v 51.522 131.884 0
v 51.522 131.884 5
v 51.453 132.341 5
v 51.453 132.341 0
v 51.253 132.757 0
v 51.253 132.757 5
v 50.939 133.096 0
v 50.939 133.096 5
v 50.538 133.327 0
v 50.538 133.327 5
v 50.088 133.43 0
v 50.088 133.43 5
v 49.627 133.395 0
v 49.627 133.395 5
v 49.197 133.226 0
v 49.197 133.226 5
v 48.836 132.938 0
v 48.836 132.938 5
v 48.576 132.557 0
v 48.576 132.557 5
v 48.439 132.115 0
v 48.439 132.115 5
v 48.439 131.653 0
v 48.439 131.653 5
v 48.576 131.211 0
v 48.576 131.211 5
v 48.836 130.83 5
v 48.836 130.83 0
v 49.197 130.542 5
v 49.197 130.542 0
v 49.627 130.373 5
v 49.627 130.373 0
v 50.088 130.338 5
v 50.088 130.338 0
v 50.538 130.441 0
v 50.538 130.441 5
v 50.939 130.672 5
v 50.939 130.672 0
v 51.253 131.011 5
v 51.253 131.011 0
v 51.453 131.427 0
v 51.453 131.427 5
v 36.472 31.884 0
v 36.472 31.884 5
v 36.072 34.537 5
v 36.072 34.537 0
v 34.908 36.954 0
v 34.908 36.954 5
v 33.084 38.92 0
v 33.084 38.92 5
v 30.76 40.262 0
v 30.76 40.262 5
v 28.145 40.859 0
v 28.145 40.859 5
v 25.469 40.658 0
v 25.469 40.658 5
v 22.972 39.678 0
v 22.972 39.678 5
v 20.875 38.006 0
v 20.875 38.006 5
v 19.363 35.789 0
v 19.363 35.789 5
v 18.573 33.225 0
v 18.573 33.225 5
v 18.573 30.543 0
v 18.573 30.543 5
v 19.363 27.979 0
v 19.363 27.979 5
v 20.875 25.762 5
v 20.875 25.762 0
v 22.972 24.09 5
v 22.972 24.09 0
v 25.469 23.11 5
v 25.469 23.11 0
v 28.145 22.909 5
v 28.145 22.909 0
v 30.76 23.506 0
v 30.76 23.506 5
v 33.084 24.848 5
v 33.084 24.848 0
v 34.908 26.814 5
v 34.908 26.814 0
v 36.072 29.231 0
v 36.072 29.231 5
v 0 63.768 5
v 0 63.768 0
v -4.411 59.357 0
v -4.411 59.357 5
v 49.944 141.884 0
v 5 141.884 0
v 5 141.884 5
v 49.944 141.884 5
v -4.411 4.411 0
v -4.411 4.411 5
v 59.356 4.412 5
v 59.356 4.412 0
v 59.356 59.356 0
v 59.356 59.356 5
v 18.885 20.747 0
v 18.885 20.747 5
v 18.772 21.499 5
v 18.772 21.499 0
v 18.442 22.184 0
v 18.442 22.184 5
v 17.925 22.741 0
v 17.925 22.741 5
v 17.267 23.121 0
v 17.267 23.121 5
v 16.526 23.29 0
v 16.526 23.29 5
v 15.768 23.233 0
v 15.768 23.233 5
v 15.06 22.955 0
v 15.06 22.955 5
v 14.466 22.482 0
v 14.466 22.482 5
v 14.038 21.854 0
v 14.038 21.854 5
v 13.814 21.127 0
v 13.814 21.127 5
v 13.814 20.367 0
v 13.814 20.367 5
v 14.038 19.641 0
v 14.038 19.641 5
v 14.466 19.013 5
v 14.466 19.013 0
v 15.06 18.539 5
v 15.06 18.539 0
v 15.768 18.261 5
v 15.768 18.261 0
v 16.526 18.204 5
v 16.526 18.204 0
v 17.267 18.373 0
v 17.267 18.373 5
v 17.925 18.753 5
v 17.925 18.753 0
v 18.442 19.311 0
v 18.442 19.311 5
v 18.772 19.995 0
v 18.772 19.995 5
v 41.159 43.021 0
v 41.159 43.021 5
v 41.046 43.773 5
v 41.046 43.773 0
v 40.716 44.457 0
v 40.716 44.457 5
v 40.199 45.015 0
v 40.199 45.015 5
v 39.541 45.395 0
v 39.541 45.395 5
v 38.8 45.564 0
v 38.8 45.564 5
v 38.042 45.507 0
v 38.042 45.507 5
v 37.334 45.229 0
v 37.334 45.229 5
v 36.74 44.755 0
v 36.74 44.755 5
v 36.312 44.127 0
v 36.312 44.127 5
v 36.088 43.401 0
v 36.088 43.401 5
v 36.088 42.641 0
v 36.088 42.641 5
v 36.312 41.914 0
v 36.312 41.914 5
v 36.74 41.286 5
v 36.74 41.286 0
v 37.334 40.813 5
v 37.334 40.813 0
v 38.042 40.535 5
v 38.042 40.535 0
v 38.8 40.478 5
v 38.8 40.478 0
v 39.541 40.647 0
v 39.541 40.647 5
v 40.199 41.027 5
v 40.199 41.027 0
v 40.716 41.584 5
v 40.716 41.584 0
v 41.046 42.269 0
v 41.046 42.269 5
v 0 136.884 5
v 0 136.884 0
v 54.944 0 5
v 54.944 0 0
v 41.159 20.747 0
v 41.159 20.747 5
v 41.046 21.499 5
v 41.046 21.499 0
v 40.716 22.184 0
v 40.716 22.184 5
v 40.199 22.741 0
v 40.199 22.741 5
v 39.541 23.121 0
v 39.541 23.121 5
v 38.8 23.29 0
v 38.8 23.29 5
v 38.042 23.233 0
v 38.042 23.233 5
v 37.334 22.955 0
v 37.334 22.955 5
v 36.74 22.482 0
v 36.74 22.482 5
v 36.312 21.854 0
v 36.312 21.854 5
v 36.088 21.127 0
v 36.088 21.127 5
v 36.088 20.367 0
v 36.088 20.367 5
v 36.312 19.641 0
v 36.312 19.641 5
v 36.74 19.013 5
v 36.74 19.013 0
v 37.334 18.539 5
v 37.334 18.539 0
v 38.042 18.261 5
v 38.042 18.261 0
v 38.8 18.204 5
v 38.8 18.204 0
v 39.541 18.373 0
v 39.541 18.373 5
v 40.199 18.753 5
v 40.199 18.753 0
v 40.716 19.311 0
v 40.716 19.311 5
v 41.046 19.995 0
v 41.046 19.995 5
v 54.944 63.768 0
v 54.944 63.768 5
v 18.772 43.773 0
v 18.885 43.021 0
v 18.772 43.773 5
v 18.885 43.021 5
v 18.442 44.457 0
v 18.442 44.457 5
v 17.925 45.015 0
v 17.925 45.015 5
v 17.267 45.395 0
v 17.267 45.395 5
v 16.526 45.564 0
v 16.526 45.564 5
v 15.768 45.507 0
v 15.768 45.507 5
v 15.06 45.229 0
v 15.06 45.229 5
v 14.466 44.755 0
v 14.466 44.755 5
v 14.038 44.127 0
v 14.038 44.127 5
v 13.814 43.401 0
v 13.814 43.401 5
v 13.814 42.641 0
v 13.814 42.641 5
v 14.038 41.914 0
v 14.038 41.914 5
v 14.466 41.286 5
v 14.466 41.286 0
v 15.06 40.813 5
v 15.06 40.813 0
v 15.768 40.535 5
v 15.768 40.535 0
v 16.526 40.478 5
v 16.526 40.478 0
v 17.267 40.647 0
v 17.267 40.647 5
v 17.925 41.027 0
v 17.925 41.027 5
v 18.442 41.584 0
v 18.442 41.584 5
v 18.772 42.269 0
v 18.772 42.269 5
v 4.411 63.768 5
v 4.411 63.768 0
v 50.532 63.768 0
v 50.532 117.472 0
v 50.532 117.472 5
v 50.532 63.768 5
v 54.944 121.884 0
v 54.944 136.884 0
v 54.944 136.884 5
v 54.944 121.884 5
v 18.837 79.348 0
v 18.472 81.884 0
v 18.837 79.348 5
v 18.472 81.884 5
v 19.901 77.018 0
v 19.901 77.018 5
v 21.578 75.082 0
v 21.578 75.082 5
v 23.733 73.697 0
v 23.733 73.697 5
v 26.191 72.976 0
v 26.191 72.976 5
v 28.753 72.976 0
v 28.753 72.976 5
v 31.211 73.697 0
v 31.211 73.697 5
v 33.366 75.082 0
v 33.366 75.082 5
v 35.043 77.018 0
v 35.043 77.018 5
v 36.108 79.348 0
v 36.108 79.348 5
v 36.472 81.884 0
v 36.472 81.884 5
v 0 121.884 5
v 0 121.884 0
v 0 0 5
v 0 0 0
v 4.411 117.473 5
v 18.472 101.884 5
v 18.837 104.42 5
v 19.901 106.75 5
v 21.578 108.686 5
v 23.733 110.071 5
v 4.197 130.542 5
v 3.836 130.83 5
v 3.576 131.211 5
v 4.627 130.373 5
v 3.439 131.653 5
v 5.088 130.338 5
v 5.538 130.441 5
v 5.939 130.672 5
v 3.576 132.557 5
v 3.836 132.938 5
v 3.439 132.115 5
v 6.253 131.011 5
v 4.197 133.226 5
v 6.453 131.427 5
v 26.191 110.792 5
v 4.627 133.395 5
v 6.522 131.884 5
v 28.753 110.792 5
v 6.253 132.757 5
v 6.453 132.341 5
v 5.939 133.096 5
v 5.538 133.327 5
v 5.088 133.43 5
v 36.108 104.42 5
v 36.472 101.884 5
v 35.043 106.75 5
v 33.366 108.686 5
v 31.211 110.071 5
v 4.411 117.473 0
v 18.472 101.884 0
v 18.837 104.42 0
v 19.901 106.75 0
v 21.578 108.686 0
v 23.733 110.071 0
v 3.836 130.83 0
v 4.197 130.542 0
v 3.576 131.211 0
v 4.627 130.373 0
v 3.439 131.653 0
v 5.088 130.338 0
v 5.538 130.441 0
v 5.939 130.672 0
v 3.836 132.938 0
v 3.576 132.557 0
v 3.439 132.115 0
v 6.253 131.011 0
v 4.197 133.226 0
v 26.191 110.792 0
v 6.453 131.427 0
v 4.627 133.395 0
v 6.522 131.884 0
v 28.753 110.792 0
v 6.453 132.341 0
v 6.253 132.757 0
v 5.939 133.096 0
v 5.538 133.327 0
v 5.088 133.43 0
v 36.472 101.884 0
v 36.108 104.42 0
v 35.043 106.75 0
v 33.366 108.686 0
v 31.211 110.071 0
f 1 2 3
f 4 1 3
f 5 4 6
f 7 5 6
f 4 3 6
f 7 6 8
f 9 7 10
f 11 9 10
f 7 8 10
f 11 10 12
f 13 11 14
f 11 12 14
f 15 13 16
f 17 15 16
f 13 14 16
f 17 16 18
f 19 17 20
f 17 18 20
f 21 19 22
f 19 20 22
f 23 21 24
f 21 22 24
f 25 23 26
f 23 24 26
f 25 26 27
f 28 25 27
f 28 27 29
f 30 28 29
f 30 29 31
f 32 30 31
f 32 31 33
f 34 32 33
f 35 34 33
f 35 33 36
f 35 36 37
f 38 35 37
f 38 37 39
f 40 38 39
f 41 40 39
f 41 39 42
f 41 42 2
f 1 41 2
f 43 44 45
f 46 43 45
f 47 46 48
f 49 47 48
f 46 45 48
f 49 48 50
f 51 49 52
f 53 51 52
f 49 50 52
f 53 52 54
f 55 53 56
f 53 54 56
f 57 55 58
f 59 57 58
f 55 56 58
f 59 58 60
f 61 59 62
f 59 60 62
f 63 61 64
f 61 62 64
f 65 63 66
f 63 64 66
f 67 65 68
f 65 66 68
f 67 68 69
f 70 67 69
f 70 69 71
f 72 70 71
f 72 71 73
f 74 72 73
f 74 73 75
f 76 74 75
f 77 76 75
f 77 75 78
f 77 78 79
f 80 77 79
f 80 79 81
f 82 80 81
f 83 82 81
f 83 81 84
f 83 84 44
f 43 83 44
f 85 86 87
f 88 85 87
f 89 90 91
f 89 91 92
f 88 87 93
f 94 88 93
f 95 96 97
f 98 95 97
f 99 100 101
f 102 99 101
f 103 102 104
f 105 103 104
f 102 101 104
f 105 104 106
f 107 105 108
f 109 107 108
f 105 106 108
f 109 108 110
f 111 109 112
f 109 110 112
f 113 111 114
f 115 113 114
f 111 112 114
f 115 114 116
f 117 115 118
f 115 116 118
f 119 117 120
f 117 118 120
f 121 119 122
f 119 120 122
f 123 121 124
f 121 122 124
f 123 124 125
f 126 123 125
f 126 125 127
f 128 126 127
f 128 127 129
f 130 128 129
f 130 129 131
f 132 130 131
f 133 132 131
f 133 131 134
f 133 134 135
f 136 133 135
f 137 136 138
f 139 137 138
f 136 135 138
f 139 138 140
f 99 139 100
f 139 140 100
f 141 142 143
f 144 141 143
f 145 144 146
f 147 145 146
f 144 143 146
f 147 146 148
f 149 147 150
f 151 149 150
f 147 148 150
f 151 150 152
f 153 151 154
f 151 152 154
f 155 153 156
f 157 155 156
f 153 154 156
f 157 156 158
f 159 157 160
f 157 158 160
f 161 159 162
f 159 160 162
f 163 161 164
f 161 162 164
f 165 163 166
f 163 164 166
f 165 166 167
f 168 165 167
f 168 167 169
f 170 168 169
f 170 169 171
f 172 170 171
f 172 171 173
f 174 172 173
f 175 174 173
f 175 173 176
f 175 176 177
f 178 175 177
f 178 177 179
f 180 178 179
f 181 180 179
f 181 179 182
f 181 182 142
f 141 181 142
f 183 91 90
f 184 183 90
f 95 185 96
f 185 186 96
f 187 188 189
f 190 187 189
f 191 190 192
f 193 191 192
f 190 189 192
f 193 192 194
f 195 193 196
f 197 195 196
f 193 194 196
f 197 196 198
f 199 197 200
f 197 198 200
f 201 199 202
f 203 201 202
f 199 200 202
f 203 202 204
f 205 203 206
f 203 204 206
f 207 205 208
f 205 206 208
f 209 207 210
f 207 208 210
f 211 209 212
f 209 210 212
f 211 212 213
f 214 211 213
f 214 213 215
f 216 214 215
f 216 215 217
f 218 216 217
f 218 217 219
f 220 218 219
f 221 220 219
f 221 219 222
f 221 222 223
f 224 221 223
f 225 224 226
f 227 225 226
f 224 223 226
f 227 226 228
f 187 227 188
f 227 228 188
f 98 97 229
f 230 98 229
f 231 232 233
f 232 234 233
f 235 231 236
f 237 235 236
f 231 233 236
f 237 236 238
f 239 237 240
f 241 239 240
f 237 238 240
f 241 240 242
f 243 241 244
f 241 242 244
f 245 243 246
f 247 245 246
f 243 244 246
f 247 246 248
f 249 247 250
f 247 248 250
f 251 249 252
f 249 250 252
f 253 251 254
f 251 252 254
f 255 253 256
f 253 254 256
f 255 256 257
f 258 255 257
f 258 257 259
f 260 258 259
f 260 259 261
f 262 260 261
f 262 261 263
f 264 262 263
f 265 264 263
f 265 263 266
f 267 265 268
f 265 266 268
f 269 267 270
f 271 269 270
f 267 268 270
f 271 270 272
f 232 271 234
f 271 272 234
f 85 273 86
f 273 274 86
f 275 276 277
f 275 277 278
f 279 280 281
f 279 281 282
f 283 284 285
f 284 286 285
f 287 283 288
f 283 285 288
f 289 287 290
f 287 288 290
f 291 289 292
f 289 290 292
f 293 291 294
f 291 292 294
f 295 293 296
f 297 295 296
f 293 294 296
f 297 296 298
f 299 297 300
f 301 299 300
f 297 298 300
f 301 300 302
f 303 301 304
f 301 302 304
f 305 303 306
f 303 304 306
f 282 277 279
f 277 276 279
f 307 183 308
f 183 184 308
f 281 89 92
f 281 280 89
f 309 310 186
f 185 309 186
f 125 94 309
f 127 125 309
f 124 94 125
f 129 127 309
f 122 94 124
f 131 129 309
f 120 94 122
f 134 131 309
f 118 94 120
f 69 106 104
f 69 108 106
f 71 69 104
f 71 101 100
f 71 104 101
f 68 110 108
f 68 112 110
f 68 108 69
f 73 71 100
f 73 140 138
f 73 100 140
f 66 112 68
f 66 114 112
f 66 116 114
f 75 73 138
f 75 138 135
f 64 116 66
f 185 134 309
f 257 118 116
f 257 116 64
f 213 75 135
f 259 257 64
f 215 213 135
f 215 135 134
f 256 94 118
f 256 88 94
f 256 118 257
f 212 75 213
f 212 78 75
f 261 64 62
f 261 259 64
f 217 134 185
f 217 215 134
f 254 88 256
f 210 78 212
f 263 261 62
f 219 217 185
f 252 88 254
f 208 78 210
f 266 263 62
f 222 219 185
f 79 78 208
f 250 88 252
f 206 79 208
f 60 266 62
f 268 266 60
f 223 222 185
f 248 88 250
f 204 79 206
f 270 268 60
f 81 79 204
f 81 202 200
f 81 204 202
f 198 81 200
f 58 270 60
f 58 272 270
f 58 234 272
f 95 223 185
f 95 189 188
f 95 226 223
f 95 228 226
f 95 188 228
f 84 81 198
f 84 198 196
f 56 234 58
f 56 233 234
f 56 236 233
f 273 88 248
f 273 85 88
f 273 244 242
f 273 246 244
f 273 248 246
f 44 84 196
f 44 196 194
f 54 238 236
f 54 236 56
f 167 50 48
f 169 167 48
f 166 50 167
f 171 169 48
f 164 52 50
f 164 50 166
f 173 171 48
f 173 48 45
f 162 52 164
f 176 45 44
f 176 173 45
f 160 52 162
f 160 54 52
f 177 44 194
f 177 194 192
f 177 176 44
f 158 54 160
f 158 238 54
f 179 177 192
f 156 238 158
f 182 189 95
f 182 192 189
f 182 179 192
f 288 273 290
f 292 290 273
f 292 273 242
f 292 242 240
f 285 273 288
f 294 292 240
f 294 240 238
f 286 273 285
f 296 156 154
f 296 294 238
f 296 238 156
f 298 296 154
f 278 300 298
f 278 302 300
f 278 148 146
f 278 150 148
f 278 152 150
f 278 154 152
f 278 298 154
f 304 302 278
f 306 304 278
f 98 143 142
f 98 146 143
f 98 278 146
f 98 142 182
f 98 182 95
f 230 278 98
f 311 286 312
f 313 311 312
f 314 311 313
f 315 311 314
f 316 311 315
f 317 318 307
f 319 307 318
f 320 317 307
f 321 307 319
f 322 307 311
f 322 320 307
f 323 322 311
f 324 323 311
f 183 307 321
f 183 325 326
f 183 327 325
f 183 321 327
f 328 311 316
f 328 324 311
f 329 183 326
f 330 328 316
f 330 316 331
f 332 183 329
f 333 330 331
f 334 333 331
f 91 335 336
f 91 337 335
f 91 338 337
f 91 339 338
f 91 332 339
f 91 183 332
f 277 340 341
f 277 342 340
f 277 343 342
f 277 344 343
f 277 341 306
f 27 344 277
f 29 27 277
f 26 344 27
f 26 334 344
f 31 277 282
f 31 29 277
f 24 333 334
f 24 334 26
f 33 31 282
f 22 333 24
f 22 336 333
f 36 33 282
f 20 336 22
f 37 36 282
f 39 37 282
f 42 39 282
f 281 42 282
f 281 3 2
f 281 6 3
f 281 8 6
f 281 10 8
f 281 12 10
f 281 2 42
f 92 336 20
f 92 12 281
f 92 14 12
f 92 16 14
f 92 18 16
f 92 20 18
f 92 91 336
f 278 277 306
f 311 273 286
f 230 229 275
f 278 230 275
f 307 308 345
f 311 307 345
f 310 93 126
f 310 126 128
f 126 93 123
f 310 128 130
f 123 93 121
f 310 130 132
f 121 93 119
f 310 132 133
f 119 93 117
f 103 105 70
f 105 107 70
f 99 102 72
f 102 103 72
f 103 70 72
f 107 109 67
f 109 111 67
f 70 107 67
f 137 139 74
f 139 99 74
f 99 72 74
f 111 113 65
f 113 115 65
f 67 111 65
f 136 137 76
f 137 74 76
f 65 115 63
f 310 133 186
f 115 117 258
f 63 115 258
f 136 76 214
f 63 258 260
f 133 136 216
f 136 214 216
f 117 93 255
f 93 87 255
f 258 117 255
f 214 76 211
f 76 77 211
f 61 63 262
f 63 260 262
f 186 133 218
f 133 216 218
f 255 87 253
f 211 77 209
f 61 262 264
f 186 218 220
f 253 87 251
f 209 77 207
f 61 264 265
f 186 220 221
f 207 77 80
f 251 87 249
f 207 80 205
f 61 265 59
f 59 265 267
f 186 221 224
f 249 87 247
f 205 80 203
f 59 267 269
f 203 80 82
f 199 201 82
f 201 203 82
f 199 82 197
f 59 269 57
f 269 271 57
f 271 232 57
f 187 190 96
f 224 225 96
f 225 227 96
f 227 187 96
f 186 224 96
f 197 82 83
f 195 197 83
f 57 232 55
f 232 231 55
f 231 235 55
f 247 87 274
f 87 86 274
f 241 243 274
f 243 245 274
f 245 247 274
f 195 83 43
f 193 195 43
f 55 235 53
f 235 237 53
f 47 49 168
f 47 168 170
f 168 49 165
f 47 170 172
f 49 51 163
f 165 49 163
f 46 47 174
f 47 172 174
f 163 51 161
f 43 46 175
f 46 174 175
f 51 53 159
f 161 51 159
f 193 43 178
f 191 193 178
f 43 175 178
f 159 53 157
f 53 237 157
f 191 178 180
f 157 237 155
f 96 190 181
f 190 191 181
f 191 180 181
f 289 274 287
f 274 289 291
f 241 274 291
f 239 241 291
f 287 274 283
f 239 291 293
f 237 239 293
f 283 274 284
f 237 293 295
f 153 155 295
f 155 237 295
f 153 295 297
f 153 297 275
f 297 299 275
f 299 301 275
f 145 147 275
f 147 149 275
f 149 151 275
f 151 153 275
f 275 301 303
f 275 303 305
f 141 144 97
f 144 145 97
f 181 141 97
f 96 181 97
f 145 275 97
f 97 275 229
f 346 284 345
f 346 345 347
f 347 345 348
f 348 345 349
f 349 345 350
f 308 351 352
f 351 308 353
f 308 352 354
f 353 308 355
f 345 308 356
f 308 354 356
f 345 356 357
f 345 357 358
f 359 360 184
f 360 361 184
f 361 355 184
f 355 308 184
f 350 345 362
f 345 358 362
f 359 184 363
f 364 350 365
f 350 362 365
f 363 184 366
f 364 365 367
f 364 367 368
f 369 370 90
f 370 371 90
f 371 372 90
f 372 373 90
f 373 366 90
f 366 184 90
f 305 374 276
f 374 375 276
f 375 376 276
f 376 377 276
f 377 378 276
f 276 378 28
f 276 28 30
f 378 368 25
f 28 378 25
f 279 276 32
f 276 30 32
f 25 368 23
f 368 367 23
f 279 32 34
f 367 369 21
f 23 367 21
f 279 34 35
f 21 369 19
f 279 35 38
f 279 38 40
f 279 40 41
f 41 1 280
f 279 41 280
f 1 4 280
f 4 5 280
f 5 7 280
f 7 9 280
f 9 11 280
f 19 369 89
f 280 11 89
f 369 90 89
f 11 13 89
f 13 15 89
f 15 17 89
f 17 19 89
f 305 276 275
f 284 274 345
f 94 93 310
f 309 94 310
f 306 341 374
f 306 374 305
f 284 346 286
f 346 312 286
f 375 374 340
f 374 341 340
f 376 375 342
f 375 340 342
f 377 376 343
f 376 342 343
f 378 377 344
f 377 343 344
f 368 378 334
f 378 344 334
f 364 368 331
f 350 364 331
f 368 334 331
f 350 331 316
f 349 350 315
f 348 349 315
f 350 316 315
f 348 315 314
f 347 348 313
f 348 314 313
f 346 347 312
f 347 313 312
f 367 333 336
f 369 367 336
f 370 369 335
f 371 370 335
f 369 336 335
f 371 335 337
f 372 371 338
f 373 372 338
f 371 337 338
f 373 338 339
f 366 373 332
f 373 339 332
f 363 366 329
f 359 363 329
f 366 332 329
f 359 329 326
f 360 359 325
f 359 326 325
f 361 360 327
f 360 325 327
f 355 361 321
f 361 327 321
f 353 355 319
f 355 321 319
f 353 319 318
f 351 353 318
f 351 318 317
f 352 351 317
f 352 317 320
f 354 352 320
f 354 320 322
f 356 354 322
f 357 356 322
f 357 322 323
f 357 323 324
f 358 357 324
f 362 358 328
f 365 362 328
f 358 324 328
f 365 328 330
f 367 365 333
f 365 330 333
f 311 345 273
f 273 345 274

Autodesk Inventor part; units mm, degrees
ref_plane "YZ Plane" through (0, 0, 0) normal (1, 0, 0) x (0, 1, 0)
ref_plane "XZ Plane" through (0, 0, 0) normal (0, 1, 0) x (-1, 0, 0)
ref_plane "XY Plane" through (0, 0, 0) normal (0, 0, 1) x (1, 0, 0)
sketch "Sketch1" plane through (0, 0, 0) normal (0, 0, 1) x (1, 0, 0)
  line L0 (0, 0) -> (54.9443, 0)
  line L1 (54.9443, 0) -> (59.3561, 4.4119)
  line L2 (59.3561, 4.4119) -> (59.3561, 59.3561)
  line L3 (59.3561, 59.3561) -> (54.9443, 63.768)
  line L4 (54.9443, 63.768) -> (0, 63.768)
  line L5 (0, 63.768) -> (-4.4114, 59.3566)
  line L6 (-4.4114, 59.3566) -> (-4.4114, 4.4114)
  line L7 (-4.4114, 4.4114) -> (0, 0)
  circle A0 centre (38.6091, 43.0209) radius 2.5
  circle A1 centre (16.3352, 43.0209) radius 2.5
  circle A2 centre (38.6091, 20.7471) radius 2.5
  circle A3 centre (16.3352, 20.7471) radius 2.5
  circle A4 centre (4.9721, 131.884) radius 1.5
  circle A5 centre (49.9721, 131.884) radius 1.5
  line L8 (0, 131.884) -> (0, 141.884)
  line L9 (0, 141.884) -> (54.9443, 141.884)
  line L10 (54.9443, 141.884) -> (54.9443, 131.884)
  line L11 (0, 131.884) -> (0, 121.884)
  line L12 (54.9443, 121.884) -> (54.9443, 131.884)
  line L13 (0, 121.884) -> (4.4114, 117.4726)
  line L14 (50.5324, 117.4721) -> (54.9443, 121.884)
  line L15 (4.4114, 117.4726) -> (4.4114, 63.768)
  line L16 (50.5324, 117.4721) -> (50.5324, 63.768)
  dimension "d3" = 3
  dimension "d4" = 3
  dimension "d5" = 10
  dimension "d6" = 10
extrude "Extrusion1" add sketch "Sketch1" along normal blind 5
chamfer "Chamfer1" distance 5 angle 45 2 edges at (0, 141.884, 2.5) (54.9443, 141.884, 2.5)
sketch "Sketch2" plane through (0, 0, 5) normal (0, 0, 1) x (1, 0, 0)
  line L0 (49.9443, 141.884) -> (54.9443, 136.884) projected
  line L1 (49.9443, 141.884) -> (5, 141.884) projected
  line L2 (0, 136.884) -> (5, 141.884) projected
  line L3 (0, 136.884) -> (0, 121.884) projected
  line L4 (0, 121.884) -> (4.4114, 117.4726) projected
  line L5 (4.4114, 117.4726) -> (4.4114, 63.768) projected
  line L6 (4.4114, 63.768) -> (0, 63.768) projected
  line L7 (0, 63.768) -> (-4.4114, 59.3566) projected
  line L8 (-4.4114, 59.3566) -> (-4.4114, 4.4114) projected
  line L9 (-4.4114, 4.4114) -> (0, 0) projected
  line L10 (0, 0) -> (54.9443, 0) projected
  line L11 (54.9443, 0) -> (59.3561, 4.4119) projected
  line L12 (59.3561, 4.4119) -> (59.3561, 59.3561) projected
  line L13 (59.3561, 59.3561) -> (54.9443, 63.768) projected
  line L14 (54.9443, 63.768) -> (50.5324, 63.768) projected
  line L15 (50.5324, 63.768) -> (50.5324, 117.4721) projected
  line L16 (50.5324, 117.4721) -> (54.9443, 121.884) projected
  line L17 (54.9443, 121.884) -> (54.9443, 136.884) projected
  circle A0 centre (49.9721, 131.884) radius 1.5 projected
  circle A1 centre (4.9721, 131.884) radius 1.5 projected
  circle A2 centre (38.6091, 20.7471) radius 2.5 projected
  circle A3 centre (38.6091, 43.0209) radius 2.5 projected
  circle A4 centre (16.3352, 43.0209) radius 2.5 projected
  circle A5 centre (16.3352, 20.7471) radius 2.5 projected
  circle A6 centre (27.4721, 31.884) radius 9
  dimension "d12" = 18
extrude "Extrusion2" cut sketch "Sketch2" against normal blind 5 contours A6
sketch "Sketch3" plane through (0, 0, 5) normal (0, 0, 1) x (1, 0, 0)
  arc A0 (36.4721, 101.884) -> (18.4721, 101.884) centre (27.4721, 101.884) ccw
  line L0 (18.4721, 101.884) -> (18.4721, 81.884)
  line L1 (36.4721, 101.884) -> (36.4721, 81.884)
  circle A1 centre (27.4721, 31.884) radius 9 projected
  line L2 (27.4721, 71.884) -> (27.4721, 81.884)
  arc A2 (18.4721, 81.884) -> (36.4721, 81.884) centre (27.4721, 81.884) ccw
  point P0 (0, 0)
  dimension "d16" = 18
  dimension "d20" = 10
  dimension "d21" = 18
extrude "Extrusion3" cut sketch "Sketch3" against normal blind 10 contours L1 A2 L0 A0
sketch "Sketch4" plane through (0, 0, 5) normal (0, 0, 1) x (1, 0, 0)
  circle A0 centre (16.3352, 43.0209) radius 2.5 projected
  circle A1 centre (16.3352, 43.0209) radius 2.55
  circle A2 centre (38.6091, 43.0209) radius 2.5 projected
  circle A3 centre (38.6091, 43.0209) radius 2.55
  circle A4 centre (38.6091, 20.7471) radius 2.5 projected
  circle A5 centre (38.6091, 20.7471) radius 2.55
  circle A6 centre (16.3352, 20.7471) radius 2.5 projected
  circle A7 centre (16.3352, 20.7471) radius 2.55
  circle A8 centre (4.9721, 131.884) radius 1.5 projected
  circle A9 centre (4.9721, 131.884) radius 1.55
  circle A10 centre (49.9721, 131.884) radius 1.5 projected
  circle A11 centre (49.9721, 131.884) radius 1.55
  point P0 (0, 0)
  dimension "d22" = 5.1
  dimension "d23" = 5.1
  dimension "d24" = 5.1
  dimension "d25" = 5.1
  dimension "d26" = 3.1
  dimension "d27" = 3.1
extrude "Extrusion4" cut sketch "Sketch4" against normal blind 10 contours A0 | A1 | A2 | A3 | A4 | A5 | A6 | A7 | A8 | A9 | A10 | A11
properties part number "Part1_Camera"
